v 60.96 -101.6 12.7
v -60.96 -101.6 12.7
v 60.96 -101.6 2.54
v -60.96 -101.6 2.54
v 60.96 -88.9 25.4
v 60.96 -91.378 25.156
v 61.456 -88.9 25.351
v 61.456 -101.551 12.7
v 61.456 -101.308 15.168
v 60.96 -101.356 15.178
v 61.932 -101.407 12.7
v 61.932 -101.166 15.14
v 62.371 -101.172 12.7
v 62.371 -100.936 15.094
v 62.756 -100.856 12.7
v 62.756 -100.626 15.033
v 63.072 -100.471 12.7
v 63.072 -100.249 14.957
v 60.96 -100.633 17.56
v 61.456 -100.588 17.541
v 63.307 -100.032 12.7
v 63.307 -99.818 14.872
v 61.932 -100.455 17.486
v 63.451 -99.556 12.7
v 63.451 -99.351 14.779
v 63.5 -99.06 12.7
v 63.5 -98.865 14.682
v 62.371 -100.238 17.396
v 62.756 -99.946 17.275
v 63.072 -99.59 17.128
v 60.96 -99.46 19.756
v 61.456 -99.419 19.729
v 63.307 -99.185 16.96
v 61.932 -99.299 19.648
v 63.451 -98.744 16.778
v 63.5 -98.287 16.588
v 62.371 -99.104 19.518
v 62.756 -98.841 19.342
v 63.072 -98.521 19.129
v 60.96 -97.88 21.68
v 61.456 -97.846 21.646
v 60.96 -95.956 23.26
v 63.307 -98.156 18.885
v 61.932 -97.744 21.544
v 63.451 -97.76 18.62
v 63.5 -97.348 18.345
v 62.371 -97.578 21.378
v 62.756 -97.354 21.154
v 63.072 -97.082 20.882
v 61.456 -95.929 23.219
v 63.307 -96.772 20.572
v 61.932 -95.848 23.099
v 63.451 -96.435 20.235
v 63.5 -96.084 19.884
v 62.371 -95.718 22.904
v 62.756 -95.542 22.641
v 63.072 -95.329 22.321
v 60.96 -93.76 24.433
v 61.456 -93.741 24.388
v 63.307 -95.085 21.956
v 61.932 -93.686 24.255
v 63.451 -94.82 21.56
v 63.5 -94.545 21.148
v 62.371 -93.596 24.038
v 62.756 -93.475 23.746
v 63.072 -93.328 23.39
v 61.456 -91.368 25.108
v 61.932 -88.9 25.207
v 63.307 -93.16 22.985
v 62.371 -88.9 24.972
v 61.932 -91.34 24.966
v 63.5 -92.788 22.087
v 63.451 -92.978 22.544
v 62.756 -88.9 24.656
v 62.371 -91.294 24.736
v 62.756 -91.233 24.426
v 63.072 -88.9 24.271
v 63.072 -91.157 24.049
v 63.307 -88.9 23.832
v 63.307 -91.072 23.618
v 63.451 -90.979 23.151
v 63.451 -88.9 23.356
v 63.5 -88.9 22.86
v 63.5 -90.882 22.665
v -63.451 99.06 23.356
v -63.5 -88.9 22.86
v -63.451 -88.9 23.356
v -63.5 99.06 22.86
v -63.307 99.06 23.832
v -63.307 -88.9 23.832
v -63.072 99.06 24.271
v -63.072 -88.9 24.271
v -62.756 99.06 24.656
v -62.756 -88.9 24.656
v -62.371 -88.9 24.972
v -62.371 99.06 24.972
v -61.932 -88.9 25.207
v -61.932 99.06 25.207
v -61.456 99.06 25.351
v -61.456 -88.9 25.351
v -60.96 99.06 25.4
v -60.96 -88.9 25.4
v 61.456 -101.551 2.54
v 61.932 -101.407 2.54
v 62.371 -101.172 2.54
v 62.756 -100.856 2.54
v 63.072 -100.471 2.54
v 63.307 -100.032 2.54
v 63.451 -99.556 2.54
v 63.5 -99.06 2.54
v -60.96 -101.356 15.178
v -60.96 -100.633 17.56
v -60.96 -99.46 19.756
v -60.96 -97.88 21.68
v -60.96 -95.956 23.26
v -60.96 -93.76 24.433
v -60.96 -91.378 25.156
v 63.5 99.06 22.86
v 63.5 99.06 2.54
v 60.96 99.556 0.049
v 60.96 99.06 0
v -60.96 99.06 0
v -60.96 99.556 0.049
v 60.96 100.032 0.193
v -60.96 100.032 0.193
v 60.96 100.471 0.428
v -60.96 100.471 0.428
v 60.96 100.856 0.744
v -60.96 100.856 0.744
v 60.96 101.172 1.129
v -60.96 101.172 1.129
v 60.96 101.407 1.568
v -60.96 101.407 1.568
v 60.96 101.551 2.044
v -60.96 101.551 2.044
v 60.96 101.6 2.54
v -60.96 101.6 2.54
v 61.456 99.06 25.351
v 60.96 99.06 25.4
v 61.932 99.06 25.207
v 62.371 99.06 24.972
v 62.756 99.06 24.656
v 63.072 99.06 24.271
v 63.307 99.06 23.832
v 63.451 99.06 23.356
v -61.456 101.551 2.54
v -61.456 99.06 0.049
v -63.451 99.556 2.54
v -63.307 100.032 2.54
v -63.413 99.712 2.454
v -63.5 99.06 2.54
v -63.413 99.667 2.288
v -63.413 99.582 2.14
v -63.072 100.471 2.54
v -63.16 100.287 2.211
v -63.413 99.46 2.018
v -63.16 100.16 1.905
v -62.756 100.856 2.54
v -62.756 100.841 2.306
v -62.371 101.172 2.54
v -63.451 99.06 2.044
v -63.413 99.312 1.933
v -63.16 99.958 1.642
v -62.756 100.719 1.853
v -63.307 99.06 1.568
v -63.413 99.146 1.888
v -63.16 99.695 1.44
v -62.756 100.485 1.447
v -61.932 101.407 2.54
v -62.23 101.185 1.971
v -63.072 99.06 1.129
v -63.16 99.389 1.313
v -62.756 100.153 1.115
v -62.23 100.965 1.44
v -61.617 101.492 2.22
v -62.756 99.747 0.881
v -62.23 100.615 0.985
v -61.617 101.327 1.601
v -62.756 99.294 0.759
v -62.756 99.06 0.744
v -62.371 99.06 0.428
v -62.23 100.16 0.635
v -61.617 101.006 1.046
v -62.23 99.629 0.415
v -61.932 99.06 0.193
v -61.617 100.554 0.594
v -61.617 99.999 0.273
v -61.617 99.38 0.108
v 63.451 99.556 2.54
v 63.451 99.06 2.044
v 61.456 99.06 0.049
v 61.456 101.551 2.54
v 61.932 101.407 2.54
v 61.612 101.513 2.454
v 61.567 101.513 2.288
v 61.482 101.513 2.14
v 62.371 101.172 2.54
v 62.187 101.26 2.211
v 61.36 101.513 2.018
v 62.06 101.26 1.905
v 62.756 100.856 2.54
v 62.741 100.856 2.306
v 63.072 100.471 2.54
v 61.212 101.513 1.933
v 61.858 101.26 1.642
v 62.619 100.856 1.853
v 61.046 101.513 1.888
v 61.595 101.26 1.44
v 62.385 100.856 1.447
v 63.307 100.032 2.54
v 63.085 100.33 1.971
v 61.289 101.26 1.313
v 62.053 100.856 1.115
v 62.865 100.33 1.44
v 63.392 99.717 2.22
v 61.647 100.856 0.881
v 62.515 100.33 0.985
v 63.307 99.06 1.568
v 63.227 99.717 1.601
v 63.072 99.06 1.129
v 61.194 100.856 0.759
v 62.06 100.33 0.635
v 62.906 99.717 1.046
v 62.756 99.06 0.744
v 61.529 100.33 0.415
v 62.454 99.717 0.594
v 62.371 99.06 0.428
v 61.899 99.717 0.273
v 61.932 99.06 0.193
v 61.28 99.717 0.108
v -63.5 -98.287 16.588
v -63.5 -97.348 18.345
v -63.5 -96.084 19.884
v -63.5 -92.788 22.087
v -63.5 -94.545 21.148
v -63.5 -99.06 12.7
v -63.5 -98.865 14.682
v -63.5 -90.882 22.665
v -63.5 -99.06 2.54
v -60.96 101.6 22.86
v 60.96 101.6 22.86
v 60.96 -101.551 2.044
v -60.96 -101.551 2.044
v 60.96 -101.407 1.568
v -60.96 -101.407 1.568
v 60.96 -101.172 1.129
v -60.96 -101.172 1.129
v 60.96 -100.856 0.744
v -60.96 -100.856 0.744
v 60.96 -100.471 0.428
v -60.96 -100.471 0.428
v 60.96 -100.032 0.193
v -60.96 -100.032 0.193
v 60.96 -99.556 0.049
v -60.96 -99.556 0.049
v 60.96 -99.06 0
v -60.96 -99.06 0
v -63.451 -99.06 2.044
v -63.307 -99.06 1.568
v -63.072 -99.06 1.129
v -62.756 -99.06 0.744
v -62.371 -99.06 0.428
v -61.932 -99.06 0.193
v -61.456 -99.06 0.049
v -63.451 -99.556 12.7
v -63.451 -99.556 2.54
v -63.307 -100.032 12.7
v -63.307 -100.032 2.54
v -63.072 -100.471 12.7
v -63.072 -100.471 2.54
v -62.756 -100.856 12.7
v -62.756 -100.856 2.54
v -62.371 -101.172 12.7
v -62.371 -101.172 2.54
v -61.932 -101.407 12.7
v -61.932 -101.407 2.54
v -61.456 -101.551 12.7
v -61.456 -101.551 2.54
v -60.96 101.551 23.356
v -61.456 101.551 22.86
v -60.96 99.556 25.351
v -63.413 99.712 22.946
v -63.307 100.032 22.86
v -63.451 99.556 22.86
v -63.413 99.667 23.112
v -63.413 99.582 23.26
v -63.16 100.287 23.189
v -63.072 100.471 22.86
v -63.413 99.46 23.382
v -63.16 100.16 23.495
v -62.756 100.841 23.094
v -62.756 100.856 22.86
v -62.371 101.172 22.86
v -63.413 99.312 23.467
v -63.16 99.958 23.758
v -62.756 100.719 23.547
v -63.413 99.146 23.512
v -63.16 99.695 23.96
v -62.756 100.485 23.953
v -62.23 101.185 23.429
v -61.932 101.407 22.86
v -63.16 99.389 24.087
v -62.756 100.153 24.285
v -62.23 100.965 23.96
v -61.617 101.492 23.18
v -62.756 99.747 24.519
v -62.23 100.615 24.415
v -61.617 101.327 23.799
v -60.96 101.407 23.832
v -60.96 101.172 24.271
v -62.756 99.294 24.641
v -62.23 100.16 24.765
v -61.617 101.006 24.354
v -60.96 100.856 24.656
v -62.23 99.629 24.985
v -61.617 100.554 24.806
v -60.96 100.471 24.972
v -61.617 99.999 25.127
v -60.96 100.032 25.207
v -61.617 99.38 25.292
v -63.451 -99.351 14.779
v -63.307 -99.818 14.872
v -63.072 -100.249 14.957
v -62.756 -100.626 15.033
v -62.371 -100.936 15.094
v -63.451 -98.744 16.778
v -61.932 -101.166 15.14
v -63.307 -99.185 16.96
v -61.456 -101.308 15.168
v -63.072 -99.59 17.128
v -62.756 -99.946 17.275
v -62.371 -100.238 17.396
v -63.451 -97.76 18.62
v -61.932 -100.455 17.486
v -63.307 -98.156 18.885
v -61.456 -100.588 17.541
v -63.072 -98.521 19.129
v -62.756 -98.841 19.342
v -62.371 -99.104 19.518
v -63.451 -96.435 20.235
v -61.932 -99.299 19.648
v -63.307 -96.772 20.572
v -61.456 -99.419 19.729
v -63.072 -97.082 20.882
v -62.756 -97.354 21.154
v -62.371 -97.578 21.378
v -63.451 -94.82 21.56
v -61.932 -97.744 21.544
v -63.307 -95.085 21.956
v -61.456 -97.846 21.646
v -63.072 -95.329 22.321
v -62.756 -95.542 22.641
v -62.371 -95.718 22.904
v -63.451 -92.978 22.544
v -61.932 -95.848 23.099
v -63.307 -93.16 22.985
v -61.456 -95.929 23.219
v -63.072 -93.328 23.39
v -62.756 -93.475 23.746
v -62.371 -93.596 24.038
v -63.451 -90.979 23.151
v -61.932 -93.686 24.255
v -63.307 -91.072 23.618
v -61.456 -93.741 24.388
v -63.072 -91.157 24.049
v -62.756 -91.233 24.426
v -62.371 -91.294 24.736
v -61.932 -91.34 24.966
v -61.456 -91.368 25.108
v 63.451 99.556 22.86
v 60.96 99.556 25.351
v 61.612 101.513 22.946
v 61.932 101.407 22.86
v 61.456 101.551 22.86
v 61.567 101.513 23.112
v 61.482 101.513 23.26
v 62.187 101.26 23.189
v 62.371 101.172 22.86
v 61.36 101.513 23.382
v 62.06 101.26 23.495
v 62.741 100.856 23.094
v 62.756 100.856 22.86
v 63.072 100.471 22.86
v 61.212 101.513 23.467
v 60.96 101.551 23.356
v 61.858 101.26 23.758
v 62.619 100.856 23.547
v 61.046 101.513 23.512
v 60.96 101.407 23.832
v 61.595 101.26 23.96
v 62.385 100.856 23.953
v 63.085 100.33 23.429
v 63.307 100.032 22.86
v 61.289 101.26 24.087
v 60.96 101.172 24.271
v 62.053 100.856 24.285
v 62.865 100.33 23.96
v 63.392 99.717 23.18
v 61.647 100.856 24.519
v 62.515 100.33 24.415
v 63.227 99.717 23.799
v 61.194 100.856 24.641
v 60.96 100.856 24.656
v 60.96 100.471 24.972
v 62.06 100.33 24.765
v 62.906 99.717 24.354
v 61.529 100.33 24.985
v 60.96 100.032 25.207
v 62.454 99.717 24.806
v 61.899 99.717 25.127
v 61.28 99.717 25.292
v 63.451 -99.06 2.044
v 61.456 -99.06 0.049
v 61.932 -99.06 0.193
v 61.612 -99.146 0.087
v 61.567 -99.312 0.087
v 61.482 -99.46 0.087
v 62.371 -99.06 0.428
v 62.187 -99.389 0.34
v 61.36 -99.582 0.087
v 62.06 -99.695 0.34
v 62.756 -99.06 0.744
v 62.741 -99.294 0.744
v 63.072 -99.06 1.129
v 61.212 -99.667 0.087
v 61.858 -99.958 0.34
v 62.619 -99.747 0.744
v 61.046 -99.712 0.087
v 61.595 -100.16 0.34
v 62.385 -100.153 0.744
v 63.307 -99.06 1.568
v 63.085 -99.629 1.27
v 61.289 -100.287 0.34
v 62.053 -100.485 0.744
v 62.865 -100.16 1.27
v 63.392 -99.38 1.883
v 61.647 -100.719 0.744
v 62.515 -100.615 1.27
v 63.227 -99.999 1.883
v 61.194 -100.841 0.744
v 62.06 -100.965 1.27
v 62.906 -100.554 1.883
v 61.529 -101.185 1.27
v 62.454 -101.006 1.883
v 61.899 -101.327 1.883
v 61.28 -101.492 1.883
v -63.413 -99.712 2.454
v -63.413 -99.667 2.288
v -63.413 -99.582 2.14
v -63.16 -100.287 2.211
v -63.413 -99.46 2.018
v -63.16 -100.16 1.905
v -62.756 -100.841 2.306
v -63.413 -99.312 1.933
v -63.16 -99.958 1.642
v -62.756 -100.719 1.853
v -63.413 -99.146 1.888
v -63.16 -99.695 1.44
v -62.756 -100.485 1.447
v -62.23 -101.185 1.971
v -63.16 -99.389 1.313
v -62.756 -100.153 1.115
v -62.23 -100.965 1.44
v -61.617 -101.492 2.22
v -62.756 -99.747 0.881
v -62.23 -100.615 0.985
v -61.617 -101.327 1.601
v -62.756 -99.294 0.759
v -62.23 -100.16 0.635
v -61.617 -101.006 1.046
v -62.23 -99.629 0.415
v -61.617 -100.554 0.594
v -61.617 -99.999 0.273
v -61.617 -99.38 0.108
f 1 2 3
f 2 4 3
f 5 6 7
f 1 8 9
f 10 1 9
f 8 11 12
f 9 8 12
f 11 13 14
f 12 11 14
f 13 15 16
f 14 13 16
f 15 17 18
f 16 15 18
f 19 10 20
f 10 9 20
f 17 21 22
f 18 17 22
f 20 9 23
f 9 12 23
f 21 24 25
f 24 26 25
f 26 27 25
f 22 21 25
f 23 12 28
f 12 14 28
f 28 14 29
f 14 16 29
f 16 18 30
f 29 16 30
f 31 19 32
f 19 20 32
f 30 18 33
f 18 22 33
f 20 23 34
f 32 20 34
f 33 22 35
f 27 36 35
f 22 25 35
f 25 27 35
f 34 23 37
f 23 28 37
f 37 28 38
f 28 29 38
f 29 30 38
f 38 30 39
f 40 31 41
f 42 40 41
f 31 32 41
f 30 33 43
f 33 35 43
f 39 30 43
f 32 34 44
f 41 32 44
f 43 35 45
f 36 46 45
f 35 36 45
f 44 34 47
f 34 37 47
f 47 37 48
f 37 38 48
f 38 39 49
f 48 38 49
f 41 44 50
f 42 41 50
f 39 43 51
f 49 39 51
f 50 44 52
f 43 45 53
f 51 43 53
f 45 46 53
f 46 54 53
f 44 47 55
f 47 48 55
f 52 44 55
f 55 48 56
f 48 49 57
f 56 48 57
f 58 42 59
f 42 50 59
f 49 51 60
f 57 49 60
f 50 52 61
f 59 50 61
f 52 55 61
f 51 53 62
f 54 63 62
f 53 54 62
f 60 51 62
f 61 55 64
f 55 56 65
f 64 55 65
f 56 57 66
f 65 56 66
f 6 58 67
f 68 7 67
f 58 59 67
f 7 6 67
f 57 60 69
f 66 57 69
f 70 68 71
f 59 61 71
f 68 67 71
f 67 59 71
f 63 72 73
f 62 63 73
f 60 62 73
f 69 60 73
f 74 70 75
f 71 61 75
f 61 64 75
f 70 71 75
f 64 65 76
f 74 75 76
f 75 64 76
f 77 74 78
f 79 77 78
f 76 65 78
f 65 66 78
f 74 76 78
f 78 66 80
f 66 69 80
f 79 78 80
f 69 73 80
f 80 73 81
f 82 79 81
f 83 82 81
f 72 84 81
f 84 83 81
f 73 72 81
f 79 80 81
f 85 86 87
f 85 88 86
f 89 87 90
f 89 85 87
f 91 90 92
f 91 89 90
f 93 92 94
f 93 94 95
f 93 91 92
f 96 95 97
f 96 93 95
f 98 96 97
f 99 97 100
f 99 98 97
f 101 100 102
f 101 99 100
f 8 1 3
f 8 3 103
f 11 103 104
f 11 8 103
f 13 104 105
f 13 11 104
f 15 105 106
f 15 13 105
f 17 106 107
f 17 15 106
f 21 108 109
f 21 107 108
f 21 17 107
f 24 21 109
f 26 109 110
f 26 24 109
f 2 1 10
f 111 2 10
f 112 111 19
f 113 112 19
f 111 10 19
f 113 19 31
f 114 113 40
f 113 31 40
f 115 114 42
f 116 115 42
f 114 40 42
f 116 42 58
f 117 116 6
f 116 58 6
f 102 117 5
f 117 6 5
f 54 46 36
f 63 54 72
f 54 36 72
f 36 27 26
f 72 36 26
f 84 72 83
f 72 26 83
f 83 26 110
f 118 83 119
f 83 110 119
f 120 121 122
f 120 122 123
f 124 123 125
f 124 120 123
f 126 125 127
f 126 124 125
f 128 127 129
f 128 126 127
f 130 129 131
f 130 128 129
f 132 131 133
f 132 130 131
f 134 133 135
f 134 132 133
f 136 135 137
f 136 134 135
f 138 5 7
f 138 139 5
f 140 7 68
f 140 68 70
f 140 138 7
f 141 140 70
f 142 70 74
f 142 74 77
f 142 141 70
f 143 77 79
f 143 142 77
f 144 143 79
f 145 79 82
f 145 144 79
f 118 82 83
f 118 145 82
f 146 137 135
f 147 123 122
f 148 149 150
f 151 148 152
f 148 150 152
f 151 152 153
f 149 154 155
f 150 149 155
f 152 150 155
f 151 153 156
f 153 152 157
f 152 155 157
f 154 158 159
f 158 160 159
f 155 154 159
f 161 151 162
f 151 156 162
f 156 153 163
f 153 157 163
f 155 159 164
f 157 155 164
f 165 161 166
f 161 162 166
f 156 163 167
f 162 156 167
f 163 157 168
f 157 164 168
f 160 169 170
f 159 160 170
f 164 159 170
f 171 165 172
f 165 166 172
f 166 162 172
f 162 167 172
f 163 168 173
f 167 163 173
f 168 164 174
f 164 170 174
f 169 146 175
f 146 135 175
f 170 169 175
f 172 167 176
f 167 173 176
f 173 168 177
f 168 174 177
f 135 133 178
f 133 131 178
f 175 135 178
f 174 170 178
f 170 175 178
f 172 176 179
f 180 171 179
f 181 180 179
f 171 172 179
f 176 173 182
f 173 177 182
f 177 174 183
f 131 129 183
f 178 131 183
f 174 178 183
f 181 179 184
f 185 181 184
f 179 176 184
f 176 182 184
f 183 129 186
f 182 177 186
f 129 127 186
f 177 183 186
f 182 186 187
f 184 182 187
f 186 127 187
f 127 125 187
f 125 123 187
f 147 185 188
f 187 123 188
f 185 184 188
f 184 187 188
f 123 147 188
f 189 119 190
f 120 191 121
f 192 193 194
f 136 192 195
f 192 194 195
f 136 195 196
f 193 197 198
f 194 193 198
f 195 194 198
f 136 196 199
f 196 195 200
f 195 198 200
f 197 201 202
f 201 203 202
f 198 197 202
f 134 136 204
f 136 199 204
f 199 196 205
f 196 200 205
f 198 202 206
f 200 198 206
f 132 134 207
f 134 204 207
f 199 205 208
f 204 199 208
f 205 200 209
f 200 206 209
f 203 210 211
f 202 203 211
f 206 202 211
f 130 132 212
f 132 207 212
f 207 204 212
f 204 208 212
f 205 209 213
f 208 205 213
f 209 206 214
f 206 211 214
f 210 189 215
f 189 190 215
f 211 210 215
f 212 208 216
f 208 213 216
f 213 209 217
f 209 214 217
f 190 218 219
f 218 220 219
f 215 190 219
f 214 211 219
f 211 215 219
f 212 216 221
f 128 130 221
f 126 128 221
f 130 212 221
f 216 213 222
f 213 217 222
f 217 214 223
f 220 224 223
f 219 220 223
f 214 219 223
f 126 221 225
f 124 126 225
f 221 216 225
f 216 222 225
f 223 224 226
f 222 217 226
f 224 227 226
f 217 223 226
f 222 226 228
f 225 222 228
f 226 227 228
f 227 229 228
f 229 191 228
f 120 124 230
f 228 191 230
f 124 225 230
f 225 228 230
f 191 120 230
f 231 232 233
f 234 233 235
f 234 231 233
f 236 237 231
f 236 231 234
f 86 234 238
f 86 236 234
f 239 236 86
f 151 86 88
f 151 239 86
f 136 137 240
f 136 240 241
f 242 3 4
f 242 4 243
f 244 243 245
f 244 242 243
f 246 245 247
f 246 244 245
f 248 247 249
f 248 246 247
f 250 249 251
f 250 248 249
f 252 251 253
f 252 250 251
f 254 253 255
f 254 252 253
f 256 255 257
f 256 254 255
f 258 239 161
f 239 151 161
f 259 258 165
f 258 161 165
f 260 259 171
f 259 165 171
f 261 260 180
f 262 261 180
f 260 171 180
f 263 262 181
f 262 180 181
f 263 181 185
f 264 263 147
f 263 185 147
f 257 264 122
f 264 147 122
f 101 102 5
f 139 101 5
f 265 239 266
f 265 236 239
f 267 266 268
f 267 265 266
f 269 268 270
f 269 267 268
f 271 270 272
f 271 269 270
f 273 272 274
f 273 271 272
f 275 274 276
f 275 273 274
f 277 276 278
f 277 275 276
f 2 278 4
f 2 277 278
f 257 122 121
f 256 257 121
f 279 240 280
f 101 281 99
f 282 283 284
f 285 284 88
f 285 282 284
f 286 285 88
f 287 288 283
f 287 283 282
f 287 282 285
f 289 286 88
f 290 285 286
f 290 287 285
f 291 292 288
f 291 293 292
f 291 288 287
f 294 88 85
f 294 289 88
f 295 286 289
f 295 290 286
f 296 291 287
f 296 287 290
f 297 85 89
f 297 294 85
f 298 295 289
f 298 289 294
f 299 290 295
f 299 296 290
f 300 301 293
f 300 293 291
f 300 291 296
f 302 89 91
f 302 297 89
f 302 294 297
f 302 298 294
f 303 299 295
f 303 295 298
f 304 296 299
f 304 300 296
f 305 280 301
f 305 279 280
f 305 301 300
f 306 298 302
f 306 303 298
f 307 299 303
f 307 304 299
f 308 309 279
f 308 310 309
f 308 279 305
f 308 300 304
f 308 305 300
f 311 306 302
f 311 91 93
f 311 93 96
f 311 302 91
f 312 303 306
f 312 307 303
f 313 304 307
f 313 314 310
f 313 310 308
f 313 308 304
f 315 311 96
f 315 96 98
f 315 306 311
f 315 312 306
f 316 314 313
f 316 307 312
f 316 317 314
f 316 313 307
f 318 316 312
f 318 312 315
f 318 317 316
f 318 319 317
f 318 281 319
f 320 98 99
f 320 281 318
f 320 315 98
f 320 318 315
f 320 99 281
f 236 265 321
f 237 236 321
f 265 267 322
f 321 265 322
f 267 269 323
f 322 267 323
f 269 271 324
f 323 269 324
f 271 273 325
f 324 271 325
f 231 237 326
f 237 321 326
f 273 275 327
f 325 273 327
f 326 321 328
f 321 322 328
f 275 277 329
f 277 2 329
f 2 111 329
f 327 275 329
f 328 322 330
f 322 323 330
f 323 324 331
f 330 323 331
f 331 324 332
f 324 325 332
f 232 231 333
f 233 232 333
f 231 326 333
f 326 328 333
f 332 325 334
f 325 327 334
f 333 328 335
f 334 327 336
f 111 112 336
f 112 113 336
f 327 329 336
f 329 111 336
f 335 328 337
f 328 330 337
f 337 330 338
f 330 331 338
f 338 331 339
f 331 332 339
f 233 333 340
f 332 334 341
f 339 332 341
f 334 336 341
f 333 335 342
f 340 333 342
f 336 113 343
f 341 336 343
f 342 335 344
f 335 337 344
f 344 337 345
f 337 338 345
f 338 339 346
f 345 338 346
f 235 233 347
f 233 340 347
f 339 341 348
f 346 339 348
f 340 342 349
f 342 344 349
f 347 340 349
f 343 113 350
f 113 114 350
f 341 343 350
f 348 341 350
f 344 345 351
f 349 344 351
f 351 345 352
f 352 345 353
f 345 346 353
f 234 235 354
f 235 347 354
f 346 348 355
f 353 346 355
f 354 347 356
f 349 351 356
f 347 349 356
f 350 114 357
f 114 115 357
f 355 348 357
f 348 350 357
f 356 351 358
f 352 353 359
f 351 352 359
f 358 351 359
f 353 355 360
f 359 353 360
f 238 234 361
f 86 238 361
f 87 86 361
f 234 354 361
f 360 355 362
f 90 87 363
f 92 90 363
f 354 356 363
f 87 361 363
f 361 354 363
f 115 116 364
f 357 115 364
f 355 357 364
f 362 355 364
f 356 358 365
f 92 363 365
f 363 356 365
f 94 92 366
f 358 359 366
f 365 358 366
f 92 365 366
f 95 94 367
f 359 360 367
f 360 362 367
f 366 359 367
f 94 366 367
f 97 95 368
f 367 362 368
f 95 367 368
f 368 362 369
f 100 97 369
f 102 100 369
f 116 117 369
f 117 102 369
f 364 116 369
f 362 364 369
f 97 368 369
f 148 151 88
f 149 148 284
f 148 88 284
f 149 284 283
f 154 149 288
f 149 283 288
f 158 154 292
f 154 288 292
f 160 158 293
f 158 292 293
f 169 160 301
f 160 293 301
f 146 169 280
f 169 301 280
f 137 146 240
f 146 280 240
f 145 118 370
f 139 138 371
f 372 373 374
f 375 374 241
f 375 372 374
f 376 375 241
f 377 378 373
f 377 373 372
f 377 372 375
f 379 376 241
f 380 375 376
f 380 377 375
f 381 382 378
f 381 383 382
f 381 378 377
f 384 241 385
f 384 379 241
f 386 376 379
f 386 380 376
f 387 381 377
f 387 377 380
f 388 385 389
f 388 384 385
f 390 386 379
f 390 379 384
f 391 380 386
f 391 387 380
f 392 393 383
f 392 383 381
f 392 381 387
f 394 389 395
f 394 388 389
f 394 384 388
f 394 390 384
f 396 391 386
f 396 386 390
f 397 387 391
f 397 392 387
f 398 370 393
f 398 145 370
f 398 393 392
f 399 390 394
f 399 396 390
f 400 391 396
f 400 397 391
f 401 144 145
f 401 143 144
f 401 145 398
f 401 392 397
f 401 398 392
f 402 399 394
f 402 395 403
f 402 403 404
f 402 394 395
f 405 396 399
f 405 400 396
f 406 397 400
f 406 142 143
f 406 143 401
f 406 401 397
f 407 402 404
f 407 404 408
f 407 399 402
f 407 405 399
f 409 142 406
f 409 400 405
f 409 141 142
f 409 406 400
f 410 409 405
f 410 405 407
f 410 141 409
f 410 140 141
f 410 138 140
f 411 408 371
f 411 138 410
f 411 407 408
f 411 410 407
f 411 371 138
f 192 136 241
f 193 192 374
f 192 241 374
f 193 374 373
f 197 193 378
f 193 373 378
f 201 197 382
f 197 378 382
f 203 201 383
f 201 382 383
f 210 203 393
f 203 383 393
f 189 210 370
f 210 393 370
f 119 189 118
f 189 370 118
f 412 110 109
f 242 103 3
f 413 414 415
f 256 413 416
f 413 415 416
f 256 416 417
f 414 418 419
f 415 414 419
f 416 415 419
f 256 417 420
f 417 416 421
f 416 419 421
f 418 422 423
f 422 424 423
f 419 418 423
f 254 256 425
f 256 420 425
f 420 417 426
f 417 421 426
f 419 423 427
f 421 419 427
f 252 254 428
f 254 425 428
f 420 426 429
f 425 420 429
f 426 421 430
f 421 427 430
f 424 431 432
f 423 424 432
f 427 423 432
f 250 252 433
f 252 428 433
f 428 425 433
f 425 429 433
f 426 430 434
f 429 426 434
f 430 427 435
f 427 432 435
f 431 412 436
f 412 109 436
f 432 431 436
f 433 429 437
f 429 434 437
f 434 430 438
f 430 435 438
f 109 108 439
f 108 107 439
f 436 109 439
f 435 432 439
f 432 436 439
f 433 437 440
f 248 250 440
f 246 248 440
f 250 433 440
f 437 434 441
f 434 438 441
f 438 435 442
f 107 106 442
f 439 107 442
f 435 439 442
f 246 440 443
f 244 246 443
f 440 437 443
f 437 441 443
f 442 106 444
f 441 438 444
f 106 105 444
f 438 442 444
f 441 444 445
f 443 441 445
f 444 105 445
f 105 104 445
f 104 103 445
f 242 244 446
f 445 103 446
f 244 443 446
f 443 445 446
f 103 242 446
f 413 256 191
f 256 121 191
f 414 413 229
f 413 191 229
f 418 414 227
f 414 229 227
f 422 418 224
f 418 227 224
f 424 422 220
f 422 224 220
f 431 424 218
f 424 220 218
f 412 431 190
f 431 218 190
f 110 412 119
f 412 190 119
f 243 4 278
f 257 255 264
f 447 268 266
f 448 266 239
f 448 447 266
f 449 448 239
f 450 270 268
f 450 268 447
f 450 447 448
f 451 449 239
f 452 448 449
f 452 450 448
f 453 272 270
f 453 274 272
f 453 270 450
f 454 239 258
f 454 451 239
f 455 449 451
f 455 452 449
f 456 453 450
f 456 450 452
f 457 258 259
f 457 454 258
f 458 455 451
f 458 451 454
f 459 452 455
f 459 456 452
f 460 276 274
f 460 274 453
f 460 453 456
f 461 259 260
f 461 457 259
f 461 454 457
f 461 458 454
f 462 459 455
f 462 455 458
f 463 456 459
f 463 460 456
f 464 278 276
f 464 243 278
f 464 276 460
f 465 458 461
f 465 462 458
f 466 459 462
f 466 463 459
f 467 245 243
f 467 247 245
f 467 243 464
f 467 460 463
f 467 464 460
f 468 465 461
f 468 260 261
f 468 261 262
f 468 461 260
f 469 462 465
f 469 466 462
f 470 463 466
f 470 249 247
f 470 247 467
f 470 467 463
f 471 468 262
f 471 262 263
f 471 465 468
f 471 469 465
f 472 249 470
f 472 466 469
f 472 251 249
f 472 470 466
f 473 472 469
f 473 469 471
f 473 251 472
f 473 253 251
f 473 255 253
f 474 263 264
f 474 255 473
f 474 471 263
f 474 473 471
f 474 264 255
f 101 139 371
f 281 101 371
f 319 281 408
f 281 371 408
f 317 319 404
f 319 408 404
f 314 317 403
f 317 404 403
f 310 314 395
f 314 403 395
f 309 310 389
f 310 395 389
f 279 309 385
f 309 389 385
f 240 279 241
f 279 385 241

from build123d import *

# Parameters (mm, degrees)
F0_W     = 127
F0_H     = 203.2
F1_DEPTH = 25.4
F2_R     = 12.7
F3_R     = 2.54


with BuildPart() as f1:
    # F0 (on Top) → F1 (new body)
    with BuildSketch(Plane.XY):
        Rectangle(F0_W, F0_H)
    extrude(amount=F1_DEPTH)

    # F2
    f2_edges = [f1.edges().sort_by_distance(p)[0] for p in [
        (0, -101.6, 25.4),
    ]]
    fillet(f2_edges, radius=F2_R)

    # F3
    f3_edges = [f1.edges().sort_by_distance(p)[0] for p in [
        (63.5, 6.35, 25.4),
        (63.5, 0, 0),
        (0, -101.6, 0),
        (63.5, 101.6, 12.7),
        (0, 101.6, 25.4),
        (0, 101.6, 0),
        (-63.5, 101.6, 12.7),
        (-63.5, 6.35, 25.4),
        (-63.5, 0, 0),
    ]]
    fillet(f3_edges, radius=F3_R)


solid = f1.part
